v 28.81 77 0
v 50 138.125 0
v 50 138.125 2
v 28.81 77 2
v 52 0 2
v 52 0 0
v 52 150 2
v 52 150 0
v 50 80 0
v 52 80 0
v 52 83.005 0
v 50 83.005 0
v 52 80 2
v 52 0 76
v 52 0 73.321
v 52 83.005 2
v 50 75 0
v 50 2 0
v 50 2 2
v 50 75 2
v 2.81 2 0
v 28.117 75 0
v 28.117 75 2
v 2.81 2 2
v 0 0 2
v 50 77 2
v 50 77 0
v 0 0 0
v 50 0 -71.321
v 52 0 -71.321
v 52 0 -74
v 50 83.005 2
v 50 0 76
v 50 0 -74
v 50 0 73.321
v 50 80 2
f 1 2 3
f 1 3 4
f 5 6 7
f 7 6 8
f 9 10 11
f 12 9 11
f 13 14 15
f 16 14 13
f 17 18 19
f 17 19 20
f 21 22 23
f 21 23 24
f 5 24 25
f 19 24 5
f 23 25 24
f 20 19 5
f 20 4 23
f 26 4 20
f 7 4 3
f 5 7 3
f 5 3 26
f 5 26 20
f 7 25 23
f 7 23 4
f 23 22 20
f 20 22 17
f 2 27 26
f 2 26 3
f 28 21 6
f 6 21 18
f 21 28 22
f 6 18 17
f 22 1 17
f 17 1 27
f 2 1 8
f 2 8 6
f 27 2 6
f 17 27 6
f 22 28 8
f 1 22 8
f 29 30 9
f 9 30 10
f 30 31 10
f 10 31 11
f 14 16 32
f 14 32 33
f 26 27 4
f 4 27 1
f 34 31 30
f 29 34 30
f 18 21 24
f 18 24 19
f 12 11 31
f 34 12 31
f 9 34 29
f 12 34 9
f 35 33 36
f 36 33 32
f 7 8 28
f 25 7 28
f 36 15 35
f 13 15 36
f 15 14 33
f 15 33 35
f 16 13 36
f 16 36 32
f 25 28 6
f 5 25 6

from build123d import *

# Parameters (mm, degrees)
EXTRUDE_1_DEPTH   = 2
EXTRUDE_2_DEPTH   = 2
EXTRUDE_2_2_DEPTH = 2


with BuildPart() as part:
    # ｽｹｯﾁ1 → ﾎﾞｽ - 押し出し1 (new body)
    with BuildSketch(Plane.XY):
        Polygon((52, 0), (52, 150), (0, 0), align=None)
        Polygon((50, 2), (50, 138.124704732), (2.81010236, 2), align=None, mode=Mode.SUBTRACT)
        Polygon((50, 77), (28.81010236, 77), (28.116769026, 75), (50, 75), align=None)
    extrude(amount=EXTRUDE_1_DEPTH)


with BuildPart() as body_2:
    # ｽｹｯﾁ2 → ﾎﾞｽ - 押し出し2 (new body)
    with BuildSketch(Plane(origin=(52, 0, 0), x_dir=(0, 0, -1), z_dir=(1, 0, 0))):
        Polygon((-2, 83.005462125), (-76, 0), (-73.320607685, 0), (-2, 80), align=None)
    extrude(amount=-EXTRUDE_2_DEPTH)


with BuildPart() as body_3:
    # ｽｹｯﾁ2 → Extrude 2 2 (new body)
    with BuildSketch(Plane(origin=(52, 0, 0), x_dir=(0, 0, -1), z_dir=(1, 0, 0))):
        Polygon((74, 0), (71.320607685, 0), (0, 80), (0, 83.005462125), align=None)
    extrude(amount=-EXTRUDE_2_2_DEPTH)


solid = Compound([part.part, body_2.part, body_3.part])
